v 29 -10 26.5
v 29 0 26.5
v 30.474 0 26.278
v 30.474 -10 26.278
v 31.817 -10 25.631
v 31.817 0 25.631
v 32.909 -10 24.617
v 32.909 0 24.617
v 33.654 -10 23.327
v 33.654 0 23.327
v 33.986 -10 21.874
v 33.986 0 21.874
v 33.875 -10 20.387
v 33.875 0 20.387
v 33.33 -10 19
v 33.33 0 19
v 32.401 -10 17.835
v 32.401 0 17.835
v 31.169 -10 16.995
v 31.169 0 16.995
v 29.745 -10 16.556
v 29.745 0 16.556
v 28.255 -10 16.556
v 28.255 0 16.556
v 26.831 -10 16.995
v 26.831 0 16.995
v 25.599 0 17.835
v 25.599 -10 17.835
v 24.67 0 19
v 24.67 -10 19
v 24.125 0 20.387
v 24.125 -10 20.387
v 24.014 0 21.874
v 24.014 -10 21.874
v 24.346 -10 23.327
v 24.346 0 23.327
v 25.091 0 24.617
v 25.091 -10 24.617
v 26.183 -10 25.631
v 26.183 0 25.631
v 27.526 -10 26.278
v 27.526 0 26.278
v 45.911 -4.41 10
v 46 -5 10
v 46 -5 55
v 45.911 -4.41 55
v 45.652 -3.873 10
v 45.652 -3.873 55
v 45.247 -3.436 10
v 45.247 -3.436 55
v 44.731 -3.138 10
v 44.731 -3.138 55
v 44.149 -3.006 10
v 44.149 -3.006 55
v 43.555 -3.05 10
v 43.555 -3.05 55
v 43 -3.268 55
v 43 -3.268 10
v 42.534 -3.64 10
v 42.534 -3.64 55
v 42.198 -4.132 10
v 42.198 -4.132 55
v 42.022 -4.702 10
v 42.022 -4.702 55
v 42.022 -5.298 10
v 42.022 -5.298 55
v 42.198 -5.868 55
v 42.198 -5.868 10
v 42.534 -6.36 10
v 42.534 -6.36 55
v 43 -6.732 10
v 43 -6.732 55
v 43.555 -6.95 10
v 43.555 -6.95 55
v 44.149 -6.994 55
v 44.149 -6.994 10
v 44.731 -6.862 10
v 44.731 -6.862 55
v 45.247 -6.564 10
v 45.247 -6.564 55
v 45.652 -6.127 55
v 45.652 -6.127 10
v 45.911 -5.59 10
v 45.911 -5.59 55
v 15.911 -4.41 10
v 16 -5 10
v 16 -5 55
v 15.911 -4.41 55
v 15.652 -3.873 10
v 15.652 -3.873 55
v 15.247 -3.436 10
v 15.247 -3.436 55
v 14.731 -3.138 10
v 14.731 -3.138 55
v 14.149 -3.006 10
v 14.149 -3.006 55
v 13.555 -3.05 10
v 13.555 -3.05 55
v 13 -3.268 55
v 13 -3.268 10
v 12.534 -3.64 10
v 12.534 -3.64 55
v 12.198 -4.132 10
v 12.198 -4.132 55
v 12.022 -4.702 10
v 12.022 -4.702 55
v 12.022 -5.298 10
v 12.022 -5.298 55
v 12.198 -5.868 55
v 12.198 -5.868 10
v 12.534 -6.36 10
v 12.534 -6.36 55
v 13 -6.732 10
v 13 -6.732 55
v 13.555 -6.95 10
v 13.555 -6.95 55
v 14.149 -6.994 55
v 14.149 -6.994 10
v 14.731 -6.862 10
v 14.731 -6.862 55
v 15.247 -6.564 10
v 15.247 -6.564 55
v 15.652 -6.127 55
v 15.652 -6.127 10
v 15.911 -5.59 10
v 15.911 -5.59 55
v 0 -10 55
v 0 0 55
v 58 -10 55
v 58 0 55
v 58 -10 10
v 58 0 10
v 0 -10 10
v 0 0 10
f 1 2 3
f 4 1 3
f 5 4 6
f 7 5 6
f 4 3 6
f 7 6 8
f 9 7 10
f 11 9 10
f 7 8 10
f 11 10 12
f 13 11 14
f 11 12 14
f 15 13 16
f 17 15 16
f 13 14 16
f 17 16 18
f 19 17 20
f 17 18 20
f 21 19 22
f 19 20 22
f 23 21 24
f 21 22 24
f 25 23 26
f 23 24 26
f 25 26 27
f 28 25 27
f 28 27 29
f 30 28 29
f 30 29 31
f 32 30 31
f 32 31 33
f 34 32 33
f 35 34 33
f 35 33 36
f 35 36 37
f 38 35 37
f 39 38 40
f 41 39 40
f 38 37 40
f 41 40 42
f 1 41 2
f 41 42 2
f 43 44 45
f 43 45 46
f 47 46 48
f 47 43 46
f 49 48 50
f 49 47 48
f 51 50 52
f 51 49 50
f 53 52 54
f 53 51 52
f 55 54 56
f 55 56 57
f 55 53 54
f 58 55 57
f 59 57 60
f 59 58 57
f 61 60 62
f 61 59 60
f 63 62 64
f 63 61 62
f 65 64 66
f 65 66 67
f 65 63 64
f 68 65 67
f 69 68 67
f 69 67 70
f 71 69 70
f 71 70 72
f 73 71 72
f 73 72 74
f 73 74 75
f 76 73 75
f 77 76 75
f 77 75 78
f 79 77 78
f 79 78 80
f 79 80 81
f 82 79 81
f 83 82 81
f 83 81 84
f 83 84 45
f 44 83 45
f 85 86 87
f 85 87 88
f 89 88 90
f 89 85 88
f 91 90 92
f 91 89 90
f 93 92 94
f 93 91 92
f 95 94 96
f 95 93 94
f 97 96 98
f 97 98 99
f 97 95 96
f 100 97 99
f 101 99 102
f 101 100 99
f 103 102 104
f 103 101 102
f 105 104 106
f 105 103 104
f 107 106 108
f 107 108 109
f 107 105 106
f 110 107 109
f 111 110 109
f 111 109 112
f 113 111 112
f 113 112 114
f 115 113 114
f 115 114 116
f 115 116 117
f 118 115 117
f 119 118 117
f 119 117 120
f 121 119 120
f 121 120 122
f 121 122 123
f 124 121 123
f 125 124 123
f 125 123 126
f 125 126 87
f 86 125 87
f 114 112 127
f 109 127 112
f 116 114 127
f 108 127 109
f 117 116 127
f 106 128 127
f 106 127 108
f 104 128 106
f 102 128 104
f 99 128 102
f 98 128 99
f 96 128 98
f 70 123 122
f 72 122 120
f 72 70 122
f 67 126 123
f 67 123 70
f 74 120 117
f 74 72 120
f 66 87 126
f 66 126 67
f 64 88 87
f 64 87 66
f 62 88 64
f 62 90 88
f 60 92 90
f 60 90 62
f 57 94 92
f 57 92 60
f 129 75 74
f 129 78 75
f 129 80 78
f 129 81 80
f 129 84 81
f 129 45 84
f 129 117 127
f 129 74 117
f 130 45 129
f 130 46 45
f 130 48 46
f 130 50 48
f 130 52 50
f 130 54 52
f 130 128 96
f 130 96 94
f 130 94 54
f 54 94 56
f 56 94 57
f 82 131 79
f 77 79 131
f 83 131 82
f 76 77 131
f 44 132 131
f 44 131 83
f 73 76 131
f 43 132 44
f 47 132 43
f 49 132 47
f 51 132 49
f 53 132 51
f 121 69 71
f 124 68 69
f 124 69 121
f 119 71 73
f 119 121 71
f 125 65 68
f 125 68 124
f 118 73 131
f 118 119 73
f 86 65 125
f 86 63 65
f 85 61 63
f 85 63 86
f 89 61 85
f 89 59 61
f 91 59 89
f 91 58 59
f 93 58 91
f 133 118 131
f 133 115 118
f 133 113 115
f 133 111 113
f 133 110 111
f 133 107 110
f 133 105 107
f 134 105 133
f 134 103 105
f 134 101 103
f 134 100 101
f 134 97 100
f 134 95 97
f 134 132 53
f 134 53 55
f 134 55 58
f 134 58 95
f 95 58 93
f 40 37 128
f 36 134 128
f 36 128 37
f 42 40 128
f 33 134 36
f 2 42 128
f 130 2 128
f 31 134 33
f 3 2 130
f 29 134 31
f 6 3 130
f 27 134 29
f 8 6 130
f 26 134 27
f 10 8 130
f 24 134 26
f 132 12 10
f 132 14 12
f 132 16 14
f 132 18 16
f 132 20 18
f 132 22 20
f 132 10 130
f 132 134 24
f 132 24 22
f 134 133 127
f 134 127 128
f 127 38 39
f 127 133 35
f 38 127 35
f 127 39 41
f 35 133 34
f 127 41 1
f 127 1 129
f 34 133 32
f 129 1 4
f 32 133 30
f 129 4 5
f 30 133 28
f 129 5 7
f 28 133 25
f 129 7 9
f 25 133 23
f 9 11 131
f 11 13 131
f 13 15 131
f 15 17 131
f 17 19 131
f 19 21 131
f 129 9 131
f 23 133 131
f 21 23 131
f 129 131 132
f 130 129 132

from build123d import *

# Parameters (mm, degrees)
SKETCH1_W           = 58
SKETCH1_H           = 10
SKETCH1_R           = 2
BOSS_EXTRUDE1_DEPTH = 55
SKETCH3_W           = 58
SKETCH3_H           = 10
CUT_EXTRUDE3_DEPTH  = 10
SKETCH4_R           = 5
CUT_EXTRUDE4_DEPTH  = 10


with BuildPart() as part:
    # Sketch1 → Boss-Extrude1 (new body)
    with BuildSketch(Plane.XY):
        with Locations((29, -5)):
            Rectangle(SKETCH1_W, SKETCH1_H)
        with Locations((14, -5)):
            Circle(SKETCH1_R, mode=Mode.SUBTRACT)
        with Locations((44, -5)):
            Circle(SKETCH1_R, mode=Mode.SUBTRACT)
    extrude(amount=BOSS_EXTRUDE1_DEPTH)

    # Sketch3 → Cut-Extrude3 (cut)
    with BuildSketch(Plane(origin=(0, 0, 0), x_dir=(-1, 0, 0), z_dir=(0, 0, -1))):
        with Locations((-29, -5)):
            Rectangle(SKETCH3_W, SKETCH3_H)
    extrude(amount=-CUT_EXTRUDE3_DEPTH, mode=Mode.SUBTRACT)

    # Sketch4 → Cut-Extrude4 (cut)
    with BuildSketch(Plane(origin=(0, 0, 0), x_dir=(1, 0, 0), z_dir=(0, 1, 0))):
        with Locations(Location((29, -21.5, 0), (0, 0, 270))):
            Circle(SKETCH4_R)
    extrude(amount=-CUT_EXTRUDE4_DEPTH, mode=Mode.SUBTRACT)


solid = part.part
